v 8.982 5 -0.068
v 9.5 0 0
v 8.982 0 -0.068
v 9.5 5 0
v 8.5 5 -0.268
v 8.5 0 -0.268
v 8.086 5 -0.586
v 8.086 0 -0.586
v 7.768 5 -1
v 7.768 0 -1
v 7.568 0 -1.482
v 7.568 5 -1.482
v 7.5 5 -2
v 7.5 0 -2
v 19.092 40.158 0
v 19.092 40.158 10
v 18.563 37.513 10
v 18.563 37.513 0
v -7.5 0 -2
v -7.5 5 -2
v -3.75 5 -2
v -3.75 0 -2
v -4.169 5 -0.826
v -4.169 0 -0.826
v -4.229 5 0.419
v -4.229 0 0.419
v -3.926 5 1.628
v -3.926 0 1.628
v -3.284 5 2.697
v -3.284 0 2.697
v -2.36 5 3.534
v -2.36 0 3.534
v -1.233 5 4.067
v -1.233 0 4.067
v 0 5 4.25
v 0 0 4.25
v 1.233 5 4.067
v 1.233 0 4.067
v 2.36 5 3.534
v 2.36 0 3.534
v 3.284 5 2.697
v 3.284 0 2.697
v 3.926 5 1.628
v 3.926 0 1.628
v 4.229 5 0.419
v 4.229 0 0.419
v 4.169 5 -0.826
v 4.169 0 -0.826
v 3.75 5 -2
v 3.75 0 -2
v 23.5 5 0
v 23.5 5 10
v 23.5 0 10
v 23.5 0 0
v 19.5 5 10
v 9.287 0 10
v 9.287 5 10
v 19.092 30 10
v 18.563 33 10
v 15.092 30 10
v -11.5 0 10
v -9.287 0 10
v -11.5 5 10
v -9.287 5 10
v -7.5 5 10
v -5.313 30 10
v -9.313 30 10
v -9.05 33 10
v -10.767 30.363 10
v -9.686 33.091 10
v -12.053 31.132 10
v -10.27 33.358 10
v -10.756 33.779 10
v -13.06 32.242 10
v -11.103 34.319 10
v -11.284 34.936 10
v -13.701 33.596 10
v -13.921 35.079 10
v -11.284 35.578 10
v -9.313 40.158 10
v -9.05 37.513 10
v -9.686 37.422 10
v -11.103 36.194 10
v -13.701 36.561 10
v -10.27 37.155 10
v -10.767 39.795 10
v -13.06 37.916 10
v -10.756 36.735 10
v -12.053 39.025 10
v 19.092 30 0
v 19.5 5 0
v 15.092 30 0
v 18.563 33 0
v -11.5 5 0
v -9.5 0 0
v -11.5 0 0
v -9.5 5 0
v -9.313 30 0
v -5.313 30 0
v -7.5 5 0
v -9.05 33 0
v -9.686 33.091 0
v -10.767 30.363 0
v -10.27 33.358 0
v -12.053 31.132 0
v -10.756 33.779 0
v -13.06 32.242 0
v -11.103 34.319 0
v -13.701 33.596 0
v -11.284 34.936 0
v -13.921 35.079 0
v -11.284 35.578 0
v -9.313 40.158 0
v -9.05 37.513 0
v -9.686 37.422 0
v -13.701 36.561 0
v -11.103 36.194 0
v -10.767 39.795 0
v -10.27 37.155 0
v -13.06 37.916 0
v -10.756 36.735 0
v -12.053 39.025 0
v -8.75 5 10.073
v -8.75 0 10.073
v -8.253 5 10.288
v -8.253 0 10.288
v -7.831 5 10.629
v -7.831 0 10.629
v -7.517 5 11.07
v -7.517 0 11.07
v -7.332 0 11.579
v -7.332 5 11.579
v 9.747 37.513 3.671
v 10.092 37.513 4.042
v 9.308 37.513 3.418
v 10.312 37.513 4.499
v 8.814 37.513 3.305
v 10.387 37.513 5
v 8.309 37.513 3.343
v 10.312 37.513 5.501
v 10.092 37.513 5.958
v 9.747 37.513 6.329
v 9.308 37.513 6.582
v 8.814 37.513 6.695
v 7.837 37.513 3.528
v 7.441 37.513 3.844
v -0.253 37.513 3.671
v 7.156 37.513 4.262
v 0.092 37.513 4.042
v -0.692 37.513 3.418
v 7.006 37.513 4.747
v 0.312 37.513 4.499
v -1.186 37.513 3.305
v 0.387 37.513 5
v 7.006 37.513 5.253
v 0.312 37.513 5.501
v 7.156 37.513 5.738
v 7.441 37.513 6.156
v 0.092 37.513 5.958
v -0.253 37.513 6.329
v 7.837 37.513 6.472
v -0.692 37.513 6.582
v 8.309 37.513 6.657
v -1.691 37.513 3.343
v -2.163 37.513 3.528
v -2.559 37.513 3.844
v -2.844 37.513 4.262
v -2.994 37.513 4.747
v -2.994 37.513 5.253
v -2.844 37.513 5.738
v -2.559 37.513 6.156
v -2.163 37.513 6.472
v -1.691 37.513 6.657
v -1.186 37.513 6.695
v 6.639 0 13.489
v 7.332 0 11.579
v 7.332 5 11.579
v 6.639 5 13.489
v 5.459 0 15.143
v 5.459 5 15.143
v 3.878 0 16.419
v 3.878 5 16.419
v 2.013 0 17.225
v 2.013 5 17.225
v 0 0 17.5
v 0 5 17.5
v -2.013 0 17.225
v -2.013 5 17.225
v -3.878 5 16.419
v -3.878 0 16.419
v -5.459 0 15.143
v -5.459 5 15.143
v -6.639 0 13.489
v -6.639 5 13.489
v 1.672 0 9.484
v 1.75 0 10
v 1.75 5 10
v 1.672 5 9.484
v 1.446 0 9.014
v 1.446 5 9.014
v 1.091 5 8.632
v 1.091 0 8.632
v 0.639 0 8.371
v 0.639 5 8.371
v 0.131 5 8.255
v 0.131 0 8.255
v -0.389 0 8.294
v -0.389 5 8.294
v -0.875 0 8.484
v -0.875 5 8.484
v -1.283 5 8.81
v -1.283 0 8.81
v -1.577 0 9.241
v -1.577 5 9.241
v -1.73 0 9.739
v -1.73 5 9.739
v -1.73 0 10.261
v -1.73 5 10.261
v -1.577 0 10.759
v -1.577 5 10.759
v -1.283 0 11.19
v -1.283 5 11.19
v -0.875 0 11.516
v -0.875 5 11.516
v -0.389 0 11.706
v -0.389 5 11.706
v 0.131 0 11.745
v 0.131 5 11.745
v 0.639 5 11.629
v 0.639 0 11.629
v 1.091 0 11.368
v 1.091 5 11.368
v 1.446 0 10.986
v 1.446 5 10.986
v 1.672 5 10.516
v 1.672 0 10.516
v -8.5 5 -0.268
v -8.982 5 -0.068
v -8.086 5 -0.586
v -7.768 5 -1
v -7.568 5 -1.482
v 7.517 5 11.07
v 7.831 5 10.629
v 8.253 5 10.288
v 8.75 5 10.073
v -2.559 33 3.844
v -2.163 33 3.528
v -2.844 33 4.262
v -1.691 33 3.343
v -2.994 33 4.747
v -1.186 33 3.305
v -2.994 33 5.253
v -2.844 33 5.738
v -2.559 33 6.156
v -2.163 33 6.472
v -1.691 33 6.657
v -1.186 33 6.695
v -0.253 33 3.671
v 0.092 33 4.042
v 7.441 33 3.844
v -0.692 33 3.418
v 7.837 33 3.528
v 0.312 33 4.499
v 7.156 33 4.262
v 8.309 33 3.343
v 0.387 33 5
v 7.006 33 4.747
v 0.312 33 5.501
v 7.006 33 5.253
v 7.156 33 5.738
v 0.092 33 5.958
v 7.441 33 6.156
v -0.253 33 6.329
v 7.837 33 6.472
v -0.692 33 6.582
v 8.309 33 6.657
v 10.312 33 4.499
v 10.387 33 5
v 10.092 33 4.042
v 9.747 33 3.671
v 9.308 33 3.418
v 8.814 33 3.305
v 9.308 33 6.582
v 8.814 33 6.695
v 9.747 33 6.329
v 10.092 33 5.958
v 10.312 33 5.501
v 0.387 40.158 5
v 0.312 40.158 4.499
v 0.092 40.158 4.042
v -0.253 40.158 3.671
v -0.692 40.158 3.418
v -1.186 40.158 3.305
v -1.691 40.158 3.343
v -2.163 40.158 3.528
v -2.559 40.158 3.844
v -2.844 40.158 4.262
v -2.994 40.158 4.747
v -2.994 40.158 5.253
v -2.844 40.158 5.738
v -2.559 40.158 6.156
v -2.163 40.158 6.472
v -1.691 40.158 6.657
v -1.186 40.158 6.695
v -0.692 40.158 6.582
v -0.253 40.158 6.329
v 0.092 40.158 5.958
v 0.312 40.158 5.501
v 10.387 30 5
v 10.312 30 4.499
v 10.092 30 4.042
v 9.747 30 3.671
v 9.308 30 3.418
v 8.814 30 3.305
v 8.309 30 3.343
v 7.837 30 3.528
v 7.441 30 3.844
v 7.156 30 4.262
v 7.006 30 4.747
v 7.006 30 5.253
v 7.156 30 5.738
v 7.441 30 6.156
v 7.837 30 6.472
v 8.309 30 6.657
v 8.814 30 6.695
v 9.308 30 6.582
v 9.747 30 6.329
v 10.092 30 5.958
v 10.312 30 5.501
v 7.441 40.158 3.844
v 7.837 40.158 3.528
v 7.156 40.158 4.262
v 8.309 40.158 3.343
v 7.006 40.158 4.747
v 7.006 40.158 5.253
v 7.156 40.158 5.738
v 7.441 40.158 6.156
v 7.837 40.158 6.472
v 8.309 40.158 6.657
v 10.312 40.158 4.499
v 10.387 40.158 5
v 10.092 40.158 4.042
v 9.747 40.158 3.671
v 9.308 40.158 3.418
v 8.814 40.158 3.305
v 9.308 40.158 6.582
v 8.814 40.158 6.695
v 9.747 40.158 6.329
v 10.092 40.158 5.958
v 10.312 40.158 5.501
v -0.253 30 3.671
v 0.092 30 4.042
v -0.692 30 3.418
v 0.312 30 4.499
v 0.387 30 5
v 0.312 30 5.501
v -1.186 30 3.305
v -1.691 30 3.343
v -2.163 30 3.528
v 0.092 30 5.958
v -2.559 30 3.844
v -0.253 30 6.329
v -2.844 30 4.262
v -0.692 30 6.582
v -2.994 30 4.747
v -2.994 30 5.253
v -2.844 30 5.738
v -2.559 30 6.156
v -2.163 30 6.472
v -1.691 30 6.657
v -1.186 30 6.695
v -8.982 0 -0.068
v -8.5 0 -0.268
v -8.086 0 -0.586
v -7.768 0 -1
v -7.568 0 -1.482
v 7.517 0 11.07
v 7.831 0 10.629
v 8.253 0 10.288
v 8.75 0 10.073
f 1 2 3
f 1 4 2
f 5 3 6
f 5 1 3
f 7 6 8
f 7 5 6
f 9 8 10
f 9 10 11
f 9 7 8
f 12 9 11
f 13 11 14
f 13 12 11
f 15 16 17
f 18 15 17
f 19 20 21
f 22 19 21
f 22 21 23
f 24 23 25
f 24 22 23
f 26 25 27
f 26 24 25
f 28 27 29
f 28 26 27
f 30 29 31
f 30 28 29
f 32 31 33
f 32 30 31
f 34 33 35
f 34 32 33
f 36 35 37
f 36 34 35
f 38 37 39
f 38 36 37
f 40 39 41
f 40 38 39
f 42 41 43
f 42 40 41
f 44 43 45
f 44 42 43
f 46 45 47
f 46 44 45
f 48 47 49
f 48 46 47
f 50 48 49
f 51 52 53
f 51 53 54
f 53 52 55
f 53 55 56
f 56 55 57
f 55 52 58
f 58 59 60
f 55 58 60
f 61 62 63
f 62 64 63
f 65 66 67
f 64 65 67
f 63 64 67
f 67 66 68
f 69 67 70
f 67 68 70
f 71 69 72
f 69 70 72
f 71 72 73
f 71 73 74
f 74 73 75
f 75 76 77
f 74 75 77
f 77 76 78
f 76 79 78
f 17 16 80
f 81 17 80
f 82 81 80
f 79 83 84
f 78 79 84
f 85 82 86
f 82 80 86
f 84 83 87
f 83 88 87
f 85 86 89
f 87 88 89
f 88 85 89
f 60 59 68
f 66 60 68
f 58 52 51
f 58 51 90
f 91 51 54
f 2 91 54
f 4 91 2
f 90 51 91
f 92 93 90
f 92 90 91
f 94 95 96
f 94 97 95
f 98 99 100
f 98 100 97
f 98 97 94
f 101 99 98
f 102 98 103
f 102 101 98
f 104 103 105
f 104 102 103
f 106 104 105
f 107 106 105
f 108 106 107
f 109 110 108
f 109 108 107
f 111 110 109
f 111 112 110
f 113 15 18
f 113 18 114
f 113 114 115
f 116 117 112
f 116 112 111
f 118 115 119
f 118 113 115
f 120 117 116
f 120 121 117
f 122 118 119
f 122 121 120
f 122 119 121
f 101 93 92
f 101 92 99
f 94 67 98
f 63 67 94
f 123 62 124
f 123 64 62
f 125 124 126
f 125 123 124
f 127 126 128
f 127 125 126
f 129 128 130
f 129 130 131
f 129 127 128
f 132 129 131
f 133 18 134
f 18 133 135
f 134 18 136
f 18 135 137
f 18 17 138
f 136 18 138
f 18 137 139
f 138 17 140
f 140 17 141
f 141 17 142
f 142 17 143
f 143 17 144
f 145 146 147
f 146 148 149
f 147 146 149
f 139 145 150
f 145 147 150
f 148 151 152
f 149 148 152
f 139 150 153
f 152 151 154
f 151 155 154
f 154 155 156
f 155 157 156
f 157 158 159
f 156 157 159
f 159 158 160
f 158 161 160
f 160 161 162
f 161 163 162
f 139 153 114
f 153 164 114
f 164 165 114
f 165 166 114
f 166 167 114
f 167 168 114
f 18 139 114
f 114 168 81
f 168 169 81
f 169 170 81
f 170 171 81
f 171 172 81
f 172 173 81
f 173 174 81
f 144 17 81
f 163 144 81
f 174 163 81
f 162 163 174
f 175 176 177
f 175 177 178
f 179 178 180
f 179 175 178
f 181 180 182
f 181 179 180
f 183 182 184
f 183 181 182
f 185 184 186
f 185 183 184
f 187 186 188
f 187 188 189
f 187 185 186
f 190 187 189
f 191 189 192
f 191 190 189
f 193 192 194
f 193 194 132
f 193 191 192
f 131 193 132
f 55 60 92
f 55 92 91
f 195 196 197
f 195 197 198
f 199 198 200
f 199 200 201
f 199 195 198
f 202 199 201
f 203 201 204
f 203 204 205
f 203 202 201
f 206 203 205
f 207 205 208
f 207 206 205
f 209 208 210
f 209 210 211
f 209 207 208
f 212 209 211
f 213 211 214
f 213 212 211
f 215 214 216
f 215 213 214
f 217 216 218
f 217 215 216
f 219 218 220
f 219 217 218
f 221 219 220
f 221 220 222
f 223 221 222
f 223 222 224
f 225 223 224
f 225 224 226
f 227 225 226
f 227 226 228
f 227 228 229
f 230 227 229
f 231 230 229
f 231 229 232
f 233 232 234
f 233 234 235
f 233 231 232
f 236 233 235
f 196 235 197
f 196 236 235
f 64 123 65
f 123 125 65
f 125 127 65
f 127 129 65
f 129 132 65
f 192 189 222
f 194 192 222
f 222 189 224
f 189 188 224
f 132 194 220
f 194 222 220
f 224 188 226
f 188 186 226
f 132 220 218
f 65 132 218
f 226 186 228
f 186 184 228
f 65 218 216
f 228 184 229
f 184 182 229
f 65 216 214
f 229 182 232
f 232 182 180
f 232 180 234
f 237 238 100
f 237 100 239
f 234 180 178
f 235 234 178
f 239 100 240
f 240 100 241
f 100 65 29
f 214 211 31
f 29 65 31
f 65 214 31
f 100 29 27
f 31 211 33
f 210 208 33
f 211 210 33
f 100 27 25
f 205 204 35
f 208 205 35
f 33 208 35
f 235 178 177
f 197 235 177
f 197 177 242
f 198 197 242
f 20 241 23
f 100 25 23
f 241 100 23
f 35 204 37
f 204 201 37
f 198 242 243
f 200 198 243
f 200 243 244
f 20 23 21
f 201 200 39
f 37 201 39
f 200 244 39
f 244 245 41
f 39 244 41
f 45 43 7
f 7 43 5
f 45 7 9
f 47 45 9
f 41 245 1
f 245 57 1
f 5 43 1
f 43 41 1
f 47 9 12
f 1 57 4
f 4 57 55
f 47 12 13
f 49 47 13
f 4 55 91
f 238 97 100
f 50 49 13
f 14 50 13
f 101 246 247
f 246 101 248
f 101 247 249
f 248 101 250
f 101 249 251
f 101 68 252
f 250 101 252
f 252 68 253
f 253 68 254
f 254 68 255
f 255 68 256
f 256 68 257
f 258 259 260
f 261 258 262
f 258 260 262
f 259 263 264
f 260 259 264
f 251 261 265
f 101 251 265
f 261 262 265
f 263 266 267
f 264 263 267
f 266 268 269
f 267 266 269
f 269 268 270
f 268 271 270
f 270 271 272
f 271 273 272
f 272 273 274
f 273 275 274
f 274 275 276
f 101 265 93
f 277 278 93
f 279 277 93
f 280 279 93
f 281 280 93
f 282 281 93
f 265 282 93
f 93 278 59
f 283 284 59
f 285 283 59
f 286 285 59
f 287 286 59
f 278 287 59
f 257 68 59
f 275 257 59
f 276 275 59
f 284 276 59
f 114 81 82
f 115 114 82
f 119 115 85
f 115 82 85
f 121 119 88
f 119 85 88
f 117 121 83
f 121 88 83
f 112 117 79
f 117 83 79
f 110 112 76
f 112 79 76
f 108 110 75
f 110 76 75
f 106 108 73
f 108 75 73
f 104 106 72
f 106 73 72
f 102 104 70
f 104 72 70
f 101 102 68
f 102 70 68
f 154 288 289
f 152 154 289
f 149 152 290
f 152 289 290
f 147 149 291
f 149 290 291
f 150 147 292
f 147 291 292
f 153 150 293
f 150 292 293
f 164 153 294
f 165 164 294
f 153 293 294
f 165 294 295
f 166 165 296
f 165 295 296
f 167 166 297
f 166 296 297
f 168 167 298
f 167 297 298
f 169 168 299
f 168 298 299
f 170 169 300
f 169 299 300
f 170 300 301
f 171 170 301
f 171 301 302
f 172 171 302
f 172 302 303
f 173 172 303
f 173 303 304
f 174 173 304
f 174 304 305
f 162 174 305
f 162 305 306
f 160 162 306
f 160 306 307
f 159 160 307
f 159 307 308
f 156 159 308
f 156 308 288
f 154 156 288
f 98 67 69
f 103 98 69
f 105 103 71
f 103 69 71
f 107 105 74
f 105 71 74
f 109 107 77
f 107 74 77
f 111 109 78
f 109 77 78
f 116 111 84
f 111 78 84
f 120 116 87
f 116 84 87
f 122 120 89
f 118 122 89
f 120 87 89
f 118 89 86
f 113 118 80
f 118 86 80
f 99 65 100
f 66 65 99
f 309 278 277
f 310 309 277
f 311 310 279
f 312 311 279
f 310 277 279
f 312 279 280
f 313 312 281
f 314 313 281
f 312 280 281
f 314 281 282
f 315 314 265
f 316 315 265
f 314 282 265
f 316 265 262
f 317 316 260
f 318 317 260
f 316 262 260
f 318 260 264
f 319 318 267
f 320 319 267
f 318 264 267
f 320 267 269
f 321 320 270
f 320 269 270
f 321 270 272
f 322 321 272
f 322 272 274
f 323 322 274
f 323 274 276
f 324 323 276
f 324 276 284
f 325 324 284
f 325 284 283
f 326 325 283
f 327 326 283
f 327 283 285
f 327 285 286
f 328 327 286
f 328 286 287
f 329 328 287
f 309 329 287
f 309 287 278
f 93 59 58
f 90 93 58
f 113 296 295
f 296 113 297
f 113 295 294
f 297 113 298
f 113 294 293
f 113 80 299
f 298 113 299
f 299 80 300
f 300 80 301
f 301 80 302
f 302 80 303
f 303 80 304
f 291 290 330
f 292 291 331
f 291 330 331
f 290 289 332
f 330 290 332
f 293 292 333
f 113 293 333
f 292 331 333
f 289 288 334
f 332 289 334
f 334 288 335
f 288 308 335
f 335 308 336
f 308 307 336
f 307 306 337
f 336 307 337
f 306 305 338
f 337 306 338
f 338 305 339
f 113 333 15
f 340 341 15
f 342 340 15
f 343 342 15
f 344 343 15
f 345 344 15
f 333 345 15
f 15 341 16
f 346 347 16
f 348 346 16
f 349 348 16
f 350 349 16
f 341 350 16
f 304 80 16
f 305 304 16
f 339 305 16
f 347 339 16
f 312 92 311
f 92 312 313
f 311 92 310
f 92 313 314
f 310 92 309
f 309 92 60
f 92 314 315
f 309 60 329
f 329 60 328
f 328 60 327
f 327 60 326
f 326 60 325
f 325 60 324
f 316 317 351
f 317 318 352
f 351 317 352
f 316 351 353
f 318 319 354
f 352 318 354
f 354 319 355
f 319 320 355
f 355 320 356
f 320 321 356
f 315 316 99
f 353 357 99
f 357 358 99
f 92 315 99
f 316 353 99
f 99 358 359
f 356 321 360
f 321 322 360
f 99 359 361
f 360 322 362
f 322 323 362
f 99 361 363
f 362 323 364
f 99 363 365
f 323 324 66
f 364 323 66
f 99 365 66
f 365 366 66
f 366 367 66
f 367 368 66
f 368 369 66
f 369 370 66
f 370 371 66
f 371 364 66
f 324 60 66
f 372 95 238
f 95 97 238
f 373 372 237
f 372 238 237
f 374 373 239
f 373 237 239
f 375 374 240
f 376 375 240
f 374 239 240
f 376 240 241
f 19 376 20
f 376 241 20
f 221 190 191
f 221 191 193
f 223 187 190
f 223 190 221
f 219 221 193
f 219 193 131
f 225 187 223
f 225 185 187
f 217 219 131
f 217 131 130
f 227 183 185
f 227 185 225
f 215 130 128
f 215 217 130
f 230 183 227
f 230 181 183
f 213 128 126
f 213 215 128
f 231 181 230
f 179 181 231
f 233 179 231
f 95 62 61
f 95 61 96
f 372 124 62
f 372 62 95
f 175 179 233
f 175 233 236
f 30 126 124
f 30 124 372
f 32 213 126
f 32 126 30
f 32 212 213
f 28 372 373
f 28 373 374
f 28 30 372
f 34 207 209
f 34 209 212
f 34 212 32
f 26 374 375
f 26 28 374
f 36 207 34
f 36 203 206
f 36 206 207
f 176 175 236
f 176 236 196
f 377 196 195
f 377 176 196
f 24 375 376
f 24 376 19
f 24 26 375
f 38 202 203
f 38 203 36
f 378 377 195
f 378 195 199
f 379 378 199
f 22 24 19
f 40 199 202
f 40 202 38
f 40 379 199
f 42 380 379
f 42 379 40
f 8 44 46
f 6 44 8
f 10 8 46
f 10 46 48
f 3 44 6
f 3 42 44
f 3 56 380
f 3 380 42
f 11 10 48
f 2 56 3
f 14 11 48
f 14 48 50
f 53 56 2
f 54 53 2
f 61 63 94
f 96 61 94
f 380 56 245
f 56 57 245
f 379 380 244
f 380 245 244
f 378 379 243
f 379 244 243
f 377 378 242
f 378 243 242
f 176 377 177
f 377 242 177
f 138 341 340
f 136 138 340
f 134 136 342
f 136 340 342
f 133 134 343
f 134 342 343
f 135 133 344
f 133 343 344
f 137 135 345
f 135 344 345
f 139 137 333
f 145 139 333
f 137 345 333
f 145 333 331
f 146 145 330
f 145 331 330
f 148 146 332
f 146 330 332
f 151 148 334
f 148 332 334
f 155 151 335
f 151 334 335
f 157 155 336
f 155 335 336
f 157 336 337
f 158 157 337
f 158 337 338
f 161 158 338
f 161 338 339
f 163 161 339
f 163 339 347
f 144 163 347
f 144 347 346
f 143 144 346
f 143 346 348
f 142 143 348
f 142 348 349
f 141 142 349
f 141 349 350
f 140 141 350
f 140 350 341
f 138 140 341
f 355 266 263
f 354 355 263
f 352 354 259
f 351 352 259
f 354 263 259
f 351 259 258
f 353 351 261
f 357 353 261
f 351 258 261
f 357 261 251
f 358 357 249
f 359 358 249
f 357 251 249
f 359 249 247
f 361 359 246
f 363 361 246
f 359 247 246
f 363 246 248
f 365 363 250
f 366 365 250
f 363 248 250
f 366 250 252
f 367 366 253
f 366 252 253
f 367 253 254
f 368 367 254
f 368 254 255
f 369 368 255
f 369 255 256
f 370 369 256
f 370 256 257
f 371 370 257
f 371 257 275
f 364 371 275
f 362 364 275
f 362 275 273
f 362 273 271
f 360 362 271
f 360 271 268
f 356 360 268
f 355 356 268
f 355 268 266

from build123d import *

# Parameters (mm, degrees)
SKETCH1_R           = 4.25
SKETCH1_R_2         = 1.75
BOSS_EXTRUDE1_DEPTH = 5
SKETCH2_W           = 10
SKETCH2_H           = 5
BOSS_EXTRUDE2_DEPTH = 16
BOSS_EXTRUDE4_START = -15
SKETCH2_2_W         = 10
SKETCH2_2_H         = 5
BOSS_EXTRUDE4_DEPTH = 4
BOSS_EXTRUDE5_DEPTH = 10
BOSS_EXTRUDE6_DEPTH = 10
FILLET7_R           = 2
SKETCH8_W           = 24.049628059
SKETCH8_H           = 16.756852772
CUT_EXTRUDE1_DEPTH  = 6
SKETCH9_R           = 1.7
CUT_EXTRUDE2_DEPTH  = 10.15756


with BuildPart() as part:
    # Sketch1 → Boss-Extrude1 (new body)
    with BuildSketch(Plane(origin=(0, 0, 0), x_dir=(1, 0, 0), z_dir=(0, 1, 0))):
        with BuildLine():
            Line((-7.5, -10), (-7.5, 10))
            ThreePointArc((-7.5, 10), (0, 17.5), (7.5, 10))
            Line((7.5, 10), (7.5, -10))
            ThreePointArc((7.5, -10), (0, -17.5), (-7.5, -10))
        make_face()
        Circle(SKETCH1_R, mode=Mode.SUBTRACT)
        with Locations((0, 10)):
            Circle(SKETCH1_R_2, mode=Mode.SUBTRACT)
        with Locations((0, -10)):
            Circle(SKETCH1_R_2, mode=Mode.SUBTRACT)
    extrude(amount=BOSS_EXTRUDE1_DEPTH)

    # Sketch2 → Boss-Extrude2 (add)
    with BuildSketch(Plane(origin=(7.5, 0, 0), x_dir=(0, 0, -1), z_dir=(1, 0, 0))):
        with Locations((-5, 2.5)):
            Rectangle(SKETCH2_W, SKETCH2_H)
    extrude(amount=BOSS_EXTRUDE2_DEPTH)

    # Sketch2_2 → Boss-Extrude4 (add)
    with BuildSketch(Plane(origin=(7.5, 0, 0), x_dir=(0, 0, -1), z_dir=(1, 0, 0)).offset(BOSS_EXTRUDE4_START)):
        with Locations((-5, 2.5)):
            Rectangle(SKETCH2_2_W, SKETCH2_2_H)
    extrude(amount=-BOSS_EXTRUDE4_DEPTH)

    # Sketch4 → Boss-Extrude5 (add)
    with BuildSketch(Plane.XY.offset(10)):
        Polygon((-9.312783412, 30), (-11.5, 5), (-7.5, 5), (-5.312783412, 30), align=None)
        Polygon((15.091825482, 30), (19.5, 5), (23.5, 5), (19.091825482, 30), align=None)
    extrude(amount=-BOSS_EXTRUDE5_DEPTH)

    # Sketch5 → Boss-Extrude6 (add)
    with BuildSketch(Plane.XY.offset(10)):
        with BuildLine():
            Line((19.091825482, 30), (-9.312783412, 30))
            ThreePointArc((-9.312783412, 30), (-13.921057054, 35.078779792), (-9.312783412, 40.157559584))
            Line((-9.312783412, 40.157559584), (19.091825482, 40.157559584))
            Line((19.091825482, 40.157559584), (18.56284454, 37.513443833))
            Line((18.56284454, 37.513443833), (-9.050317421, 37.513443833))
            ThreePointArc((-9.050317421, 37.513443833), (-11.307039338, 35.256721917), (-9.050317421, 33))
            Line((-9.050317421, 33), (18.56284454, 33))
            Line((18.56284454, 33), (19.091825482, 30))
        make_face()
    extrude(amount=-BOSS_EXTRUDE6_DEPTH)

    # Fillet7
    fillet7_edges = [part.edges().sort_by_distance(p)[0] for p in [
        (7.5, 2.5, 0),
        (-7.5, 2.5, 0),
        (-7.5, 2.5, 10),
        (7.5, 2.5, 10),
    ]]
    fillet(fillet7_edges, radius=FILLET7_R)

    # Sketch8 → Cut-Extrude1 (cut, through all)
    with BuildSketch(Plane(origin=(0, 5, 0), x_dir=(1, 0, 0), z_dir=(0, 1, 0))):
        with Locations((0.399485588, 10.378426386)):
            Rectangle(SKETCH8_W, SKETCH8_H)
    extrude(amount=-CUT_EXTRUDE1_DEPTH, mode=Mode.SUBTRACT)

    # Sketch9 → Cut-Extrude2 (cut)
    with BuildSketch(Plane(origin=(0, 40.157559584, 0), x_dir=(1, 0, 0), z_dir=(0, 1, 0))):
        with Locations((-1.312783412, -5)):
            Circle(SKETCH9_R)
        with Locations((8.687216588, -5)):
            Circle(SKETCH9_R)
    extrude(amount=-CUT_EXTRUDE2_DEPTH, mode=Mode.SUBTRACT)


solid = part.part
